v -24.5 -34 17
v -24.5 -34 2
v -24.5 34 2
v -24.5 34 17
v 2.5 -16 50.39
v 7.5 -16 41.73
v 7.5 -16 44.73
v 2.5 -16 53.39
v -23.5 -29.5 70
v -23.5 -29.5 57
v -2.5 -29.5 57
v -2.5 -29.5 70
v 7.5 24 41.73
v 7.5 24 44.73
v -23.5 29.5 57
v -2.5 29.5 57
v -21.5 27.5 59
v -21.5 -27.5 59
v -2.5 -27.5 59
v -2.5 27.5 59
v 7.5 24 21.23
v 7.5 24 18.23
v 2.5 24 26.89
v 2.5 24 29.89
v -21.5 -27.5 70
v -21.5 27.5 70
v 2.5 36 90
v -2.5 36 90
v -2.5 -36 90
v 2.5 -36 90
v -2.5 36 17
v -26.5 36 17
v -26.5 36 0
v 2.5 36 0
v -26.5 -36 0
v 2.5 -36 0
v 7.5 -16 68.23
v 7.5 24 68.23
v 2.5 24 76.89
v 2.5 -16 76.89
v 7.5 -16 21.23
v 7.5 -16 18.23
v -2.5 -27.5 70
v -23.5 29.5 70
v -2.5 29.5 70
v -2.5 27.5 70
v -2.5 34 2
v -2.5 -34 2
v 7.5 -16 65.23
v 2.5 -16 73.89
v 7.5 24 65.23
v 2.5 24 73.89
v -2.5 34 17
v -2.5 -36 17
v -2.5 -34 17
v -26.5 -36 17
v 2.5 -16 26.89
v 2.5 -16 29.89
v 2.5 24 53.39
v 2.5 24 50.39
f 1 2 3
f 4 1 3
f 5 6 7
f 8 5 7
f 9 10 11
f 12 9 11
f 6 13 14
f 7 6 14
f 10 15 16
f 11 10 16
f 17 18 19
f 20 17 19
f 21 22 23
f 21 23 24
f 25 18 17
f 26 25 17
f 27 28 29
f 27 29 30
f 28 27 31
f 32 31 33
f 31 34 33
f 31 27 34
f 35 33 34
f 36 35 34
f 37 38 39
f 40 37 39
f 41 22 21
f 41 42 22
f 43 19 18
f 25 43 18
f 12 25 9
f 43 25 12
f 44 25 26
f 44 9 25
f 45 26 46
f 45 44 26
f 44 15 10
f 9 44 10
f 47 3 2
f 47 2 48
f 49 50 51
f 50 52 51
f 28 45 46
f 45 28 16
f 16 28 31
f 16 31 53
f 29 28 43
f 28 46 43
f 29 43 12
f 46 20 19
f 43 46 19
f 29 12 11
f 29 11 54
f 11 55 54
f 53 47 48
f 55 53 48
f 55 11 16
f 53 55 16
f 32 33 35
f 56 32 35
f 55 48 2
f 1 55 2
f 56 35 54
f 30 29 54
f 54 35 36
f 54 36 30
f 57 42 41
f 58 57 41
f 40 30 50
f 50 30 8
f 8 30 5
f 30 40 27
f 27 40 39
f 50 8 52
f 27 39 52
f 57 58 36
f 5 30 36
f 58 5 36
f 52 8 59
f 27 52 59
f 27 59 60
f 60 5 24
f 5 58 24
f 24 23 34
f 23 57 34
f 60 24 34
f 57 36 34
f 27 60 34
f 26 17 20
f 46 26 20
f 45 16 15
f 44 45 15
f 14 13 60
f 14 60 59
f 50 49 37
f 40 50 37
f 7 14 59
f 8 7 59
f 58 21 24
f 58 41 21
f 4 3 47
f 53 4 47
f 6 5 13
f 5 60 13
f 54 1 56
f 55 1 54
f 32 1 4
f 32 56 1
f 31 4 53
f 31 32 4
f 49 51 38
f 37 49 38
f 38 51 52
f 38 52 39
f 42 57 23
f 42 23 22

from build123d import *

# Parameters (mm, degrees)
F1_DEPTH  = 90
F2_DEPTH  = 17
F0_W      = 22
F0_H      = 68
F3_DEPTH  = 2
F6_DEPTH  = 13
F5_W      = 19
F5_H      = 55
F7_DEPTH  = 2
F10_DEPTH = 20


with BuildPart() as f1:
    # F0 (on Top) → F1 (new body)
    with BuildSketch(Plane.XY):
        Polygon((2.5, -36), (2.5, 36), (-2.5, 36), (-2.5, 34), (-2.5, -34), (-2.5, -36), align=None)
    extrude(amount=F1_DEPTH)

    # F0 (on Top) → F2 (join)
    with BuildSketch(Plane.XY):
        Polygon((-2.5, 34), (-2.5, 36), (-26.5, 36), (-26.5, -36), (-2.5, -36), (-2.5, -34), (-24.5, -34), (-24.5, 34), align=None)
    extrude(amount=F2_DEPTH)

    # F0 (on Top) → F3 (join)
    with BuildSketch(Plane.XY):
        with Locations((-13.5, 0)):
            Rectangle(F0_W, F0_H)
    extrude(amount=F3_DEPTH)

    # F5 (on offset) → F6 (join)
    with BuildSketch(Plane.XY.offset(57)):
        Polygon((-2.5, 27.5), (-2.5, 29.5), (-23.5, 29.5), (-23.5, -29.5), (-2.5, -29.5), (-2.5, -27.5), (-21.5, -27.5), (-21.5, 27.5), align=None)
    extrude(amount=F6_DEPTH)

    # F5 (on offset) → F7 (join)
    with BuildSketch(Plane.XY.offset(57)):
        with Locations((-12, 0)):
            Rectangle(F5_W, F5_H)
    extrude(amount=F7_DEPTH)

    # F9 (on offset) → F10 (join, symmetric)
    with BuildSketch(Plane.XZ.offset(-4)):
        Polygon((7.5, 68.2301041718), (2.5, 76.8903582096), (2.5, 73.8903582096), (7.5, 65.2301041718), align=None)
        Polygon((7.5, 44.7301041718), (2.5, 53.3903582096), (2.5, 50.3903582096), (7.5, 41.7301041718), align=None)
        Polygon((7.5, 21.2301041718), (2.5, 29.8903582096), (2.5, 26.8903582096), (7.5, 18.2301041718), align=None)
    extrude(amount=F10_DEPTH, both=True)


solid = f1.part
